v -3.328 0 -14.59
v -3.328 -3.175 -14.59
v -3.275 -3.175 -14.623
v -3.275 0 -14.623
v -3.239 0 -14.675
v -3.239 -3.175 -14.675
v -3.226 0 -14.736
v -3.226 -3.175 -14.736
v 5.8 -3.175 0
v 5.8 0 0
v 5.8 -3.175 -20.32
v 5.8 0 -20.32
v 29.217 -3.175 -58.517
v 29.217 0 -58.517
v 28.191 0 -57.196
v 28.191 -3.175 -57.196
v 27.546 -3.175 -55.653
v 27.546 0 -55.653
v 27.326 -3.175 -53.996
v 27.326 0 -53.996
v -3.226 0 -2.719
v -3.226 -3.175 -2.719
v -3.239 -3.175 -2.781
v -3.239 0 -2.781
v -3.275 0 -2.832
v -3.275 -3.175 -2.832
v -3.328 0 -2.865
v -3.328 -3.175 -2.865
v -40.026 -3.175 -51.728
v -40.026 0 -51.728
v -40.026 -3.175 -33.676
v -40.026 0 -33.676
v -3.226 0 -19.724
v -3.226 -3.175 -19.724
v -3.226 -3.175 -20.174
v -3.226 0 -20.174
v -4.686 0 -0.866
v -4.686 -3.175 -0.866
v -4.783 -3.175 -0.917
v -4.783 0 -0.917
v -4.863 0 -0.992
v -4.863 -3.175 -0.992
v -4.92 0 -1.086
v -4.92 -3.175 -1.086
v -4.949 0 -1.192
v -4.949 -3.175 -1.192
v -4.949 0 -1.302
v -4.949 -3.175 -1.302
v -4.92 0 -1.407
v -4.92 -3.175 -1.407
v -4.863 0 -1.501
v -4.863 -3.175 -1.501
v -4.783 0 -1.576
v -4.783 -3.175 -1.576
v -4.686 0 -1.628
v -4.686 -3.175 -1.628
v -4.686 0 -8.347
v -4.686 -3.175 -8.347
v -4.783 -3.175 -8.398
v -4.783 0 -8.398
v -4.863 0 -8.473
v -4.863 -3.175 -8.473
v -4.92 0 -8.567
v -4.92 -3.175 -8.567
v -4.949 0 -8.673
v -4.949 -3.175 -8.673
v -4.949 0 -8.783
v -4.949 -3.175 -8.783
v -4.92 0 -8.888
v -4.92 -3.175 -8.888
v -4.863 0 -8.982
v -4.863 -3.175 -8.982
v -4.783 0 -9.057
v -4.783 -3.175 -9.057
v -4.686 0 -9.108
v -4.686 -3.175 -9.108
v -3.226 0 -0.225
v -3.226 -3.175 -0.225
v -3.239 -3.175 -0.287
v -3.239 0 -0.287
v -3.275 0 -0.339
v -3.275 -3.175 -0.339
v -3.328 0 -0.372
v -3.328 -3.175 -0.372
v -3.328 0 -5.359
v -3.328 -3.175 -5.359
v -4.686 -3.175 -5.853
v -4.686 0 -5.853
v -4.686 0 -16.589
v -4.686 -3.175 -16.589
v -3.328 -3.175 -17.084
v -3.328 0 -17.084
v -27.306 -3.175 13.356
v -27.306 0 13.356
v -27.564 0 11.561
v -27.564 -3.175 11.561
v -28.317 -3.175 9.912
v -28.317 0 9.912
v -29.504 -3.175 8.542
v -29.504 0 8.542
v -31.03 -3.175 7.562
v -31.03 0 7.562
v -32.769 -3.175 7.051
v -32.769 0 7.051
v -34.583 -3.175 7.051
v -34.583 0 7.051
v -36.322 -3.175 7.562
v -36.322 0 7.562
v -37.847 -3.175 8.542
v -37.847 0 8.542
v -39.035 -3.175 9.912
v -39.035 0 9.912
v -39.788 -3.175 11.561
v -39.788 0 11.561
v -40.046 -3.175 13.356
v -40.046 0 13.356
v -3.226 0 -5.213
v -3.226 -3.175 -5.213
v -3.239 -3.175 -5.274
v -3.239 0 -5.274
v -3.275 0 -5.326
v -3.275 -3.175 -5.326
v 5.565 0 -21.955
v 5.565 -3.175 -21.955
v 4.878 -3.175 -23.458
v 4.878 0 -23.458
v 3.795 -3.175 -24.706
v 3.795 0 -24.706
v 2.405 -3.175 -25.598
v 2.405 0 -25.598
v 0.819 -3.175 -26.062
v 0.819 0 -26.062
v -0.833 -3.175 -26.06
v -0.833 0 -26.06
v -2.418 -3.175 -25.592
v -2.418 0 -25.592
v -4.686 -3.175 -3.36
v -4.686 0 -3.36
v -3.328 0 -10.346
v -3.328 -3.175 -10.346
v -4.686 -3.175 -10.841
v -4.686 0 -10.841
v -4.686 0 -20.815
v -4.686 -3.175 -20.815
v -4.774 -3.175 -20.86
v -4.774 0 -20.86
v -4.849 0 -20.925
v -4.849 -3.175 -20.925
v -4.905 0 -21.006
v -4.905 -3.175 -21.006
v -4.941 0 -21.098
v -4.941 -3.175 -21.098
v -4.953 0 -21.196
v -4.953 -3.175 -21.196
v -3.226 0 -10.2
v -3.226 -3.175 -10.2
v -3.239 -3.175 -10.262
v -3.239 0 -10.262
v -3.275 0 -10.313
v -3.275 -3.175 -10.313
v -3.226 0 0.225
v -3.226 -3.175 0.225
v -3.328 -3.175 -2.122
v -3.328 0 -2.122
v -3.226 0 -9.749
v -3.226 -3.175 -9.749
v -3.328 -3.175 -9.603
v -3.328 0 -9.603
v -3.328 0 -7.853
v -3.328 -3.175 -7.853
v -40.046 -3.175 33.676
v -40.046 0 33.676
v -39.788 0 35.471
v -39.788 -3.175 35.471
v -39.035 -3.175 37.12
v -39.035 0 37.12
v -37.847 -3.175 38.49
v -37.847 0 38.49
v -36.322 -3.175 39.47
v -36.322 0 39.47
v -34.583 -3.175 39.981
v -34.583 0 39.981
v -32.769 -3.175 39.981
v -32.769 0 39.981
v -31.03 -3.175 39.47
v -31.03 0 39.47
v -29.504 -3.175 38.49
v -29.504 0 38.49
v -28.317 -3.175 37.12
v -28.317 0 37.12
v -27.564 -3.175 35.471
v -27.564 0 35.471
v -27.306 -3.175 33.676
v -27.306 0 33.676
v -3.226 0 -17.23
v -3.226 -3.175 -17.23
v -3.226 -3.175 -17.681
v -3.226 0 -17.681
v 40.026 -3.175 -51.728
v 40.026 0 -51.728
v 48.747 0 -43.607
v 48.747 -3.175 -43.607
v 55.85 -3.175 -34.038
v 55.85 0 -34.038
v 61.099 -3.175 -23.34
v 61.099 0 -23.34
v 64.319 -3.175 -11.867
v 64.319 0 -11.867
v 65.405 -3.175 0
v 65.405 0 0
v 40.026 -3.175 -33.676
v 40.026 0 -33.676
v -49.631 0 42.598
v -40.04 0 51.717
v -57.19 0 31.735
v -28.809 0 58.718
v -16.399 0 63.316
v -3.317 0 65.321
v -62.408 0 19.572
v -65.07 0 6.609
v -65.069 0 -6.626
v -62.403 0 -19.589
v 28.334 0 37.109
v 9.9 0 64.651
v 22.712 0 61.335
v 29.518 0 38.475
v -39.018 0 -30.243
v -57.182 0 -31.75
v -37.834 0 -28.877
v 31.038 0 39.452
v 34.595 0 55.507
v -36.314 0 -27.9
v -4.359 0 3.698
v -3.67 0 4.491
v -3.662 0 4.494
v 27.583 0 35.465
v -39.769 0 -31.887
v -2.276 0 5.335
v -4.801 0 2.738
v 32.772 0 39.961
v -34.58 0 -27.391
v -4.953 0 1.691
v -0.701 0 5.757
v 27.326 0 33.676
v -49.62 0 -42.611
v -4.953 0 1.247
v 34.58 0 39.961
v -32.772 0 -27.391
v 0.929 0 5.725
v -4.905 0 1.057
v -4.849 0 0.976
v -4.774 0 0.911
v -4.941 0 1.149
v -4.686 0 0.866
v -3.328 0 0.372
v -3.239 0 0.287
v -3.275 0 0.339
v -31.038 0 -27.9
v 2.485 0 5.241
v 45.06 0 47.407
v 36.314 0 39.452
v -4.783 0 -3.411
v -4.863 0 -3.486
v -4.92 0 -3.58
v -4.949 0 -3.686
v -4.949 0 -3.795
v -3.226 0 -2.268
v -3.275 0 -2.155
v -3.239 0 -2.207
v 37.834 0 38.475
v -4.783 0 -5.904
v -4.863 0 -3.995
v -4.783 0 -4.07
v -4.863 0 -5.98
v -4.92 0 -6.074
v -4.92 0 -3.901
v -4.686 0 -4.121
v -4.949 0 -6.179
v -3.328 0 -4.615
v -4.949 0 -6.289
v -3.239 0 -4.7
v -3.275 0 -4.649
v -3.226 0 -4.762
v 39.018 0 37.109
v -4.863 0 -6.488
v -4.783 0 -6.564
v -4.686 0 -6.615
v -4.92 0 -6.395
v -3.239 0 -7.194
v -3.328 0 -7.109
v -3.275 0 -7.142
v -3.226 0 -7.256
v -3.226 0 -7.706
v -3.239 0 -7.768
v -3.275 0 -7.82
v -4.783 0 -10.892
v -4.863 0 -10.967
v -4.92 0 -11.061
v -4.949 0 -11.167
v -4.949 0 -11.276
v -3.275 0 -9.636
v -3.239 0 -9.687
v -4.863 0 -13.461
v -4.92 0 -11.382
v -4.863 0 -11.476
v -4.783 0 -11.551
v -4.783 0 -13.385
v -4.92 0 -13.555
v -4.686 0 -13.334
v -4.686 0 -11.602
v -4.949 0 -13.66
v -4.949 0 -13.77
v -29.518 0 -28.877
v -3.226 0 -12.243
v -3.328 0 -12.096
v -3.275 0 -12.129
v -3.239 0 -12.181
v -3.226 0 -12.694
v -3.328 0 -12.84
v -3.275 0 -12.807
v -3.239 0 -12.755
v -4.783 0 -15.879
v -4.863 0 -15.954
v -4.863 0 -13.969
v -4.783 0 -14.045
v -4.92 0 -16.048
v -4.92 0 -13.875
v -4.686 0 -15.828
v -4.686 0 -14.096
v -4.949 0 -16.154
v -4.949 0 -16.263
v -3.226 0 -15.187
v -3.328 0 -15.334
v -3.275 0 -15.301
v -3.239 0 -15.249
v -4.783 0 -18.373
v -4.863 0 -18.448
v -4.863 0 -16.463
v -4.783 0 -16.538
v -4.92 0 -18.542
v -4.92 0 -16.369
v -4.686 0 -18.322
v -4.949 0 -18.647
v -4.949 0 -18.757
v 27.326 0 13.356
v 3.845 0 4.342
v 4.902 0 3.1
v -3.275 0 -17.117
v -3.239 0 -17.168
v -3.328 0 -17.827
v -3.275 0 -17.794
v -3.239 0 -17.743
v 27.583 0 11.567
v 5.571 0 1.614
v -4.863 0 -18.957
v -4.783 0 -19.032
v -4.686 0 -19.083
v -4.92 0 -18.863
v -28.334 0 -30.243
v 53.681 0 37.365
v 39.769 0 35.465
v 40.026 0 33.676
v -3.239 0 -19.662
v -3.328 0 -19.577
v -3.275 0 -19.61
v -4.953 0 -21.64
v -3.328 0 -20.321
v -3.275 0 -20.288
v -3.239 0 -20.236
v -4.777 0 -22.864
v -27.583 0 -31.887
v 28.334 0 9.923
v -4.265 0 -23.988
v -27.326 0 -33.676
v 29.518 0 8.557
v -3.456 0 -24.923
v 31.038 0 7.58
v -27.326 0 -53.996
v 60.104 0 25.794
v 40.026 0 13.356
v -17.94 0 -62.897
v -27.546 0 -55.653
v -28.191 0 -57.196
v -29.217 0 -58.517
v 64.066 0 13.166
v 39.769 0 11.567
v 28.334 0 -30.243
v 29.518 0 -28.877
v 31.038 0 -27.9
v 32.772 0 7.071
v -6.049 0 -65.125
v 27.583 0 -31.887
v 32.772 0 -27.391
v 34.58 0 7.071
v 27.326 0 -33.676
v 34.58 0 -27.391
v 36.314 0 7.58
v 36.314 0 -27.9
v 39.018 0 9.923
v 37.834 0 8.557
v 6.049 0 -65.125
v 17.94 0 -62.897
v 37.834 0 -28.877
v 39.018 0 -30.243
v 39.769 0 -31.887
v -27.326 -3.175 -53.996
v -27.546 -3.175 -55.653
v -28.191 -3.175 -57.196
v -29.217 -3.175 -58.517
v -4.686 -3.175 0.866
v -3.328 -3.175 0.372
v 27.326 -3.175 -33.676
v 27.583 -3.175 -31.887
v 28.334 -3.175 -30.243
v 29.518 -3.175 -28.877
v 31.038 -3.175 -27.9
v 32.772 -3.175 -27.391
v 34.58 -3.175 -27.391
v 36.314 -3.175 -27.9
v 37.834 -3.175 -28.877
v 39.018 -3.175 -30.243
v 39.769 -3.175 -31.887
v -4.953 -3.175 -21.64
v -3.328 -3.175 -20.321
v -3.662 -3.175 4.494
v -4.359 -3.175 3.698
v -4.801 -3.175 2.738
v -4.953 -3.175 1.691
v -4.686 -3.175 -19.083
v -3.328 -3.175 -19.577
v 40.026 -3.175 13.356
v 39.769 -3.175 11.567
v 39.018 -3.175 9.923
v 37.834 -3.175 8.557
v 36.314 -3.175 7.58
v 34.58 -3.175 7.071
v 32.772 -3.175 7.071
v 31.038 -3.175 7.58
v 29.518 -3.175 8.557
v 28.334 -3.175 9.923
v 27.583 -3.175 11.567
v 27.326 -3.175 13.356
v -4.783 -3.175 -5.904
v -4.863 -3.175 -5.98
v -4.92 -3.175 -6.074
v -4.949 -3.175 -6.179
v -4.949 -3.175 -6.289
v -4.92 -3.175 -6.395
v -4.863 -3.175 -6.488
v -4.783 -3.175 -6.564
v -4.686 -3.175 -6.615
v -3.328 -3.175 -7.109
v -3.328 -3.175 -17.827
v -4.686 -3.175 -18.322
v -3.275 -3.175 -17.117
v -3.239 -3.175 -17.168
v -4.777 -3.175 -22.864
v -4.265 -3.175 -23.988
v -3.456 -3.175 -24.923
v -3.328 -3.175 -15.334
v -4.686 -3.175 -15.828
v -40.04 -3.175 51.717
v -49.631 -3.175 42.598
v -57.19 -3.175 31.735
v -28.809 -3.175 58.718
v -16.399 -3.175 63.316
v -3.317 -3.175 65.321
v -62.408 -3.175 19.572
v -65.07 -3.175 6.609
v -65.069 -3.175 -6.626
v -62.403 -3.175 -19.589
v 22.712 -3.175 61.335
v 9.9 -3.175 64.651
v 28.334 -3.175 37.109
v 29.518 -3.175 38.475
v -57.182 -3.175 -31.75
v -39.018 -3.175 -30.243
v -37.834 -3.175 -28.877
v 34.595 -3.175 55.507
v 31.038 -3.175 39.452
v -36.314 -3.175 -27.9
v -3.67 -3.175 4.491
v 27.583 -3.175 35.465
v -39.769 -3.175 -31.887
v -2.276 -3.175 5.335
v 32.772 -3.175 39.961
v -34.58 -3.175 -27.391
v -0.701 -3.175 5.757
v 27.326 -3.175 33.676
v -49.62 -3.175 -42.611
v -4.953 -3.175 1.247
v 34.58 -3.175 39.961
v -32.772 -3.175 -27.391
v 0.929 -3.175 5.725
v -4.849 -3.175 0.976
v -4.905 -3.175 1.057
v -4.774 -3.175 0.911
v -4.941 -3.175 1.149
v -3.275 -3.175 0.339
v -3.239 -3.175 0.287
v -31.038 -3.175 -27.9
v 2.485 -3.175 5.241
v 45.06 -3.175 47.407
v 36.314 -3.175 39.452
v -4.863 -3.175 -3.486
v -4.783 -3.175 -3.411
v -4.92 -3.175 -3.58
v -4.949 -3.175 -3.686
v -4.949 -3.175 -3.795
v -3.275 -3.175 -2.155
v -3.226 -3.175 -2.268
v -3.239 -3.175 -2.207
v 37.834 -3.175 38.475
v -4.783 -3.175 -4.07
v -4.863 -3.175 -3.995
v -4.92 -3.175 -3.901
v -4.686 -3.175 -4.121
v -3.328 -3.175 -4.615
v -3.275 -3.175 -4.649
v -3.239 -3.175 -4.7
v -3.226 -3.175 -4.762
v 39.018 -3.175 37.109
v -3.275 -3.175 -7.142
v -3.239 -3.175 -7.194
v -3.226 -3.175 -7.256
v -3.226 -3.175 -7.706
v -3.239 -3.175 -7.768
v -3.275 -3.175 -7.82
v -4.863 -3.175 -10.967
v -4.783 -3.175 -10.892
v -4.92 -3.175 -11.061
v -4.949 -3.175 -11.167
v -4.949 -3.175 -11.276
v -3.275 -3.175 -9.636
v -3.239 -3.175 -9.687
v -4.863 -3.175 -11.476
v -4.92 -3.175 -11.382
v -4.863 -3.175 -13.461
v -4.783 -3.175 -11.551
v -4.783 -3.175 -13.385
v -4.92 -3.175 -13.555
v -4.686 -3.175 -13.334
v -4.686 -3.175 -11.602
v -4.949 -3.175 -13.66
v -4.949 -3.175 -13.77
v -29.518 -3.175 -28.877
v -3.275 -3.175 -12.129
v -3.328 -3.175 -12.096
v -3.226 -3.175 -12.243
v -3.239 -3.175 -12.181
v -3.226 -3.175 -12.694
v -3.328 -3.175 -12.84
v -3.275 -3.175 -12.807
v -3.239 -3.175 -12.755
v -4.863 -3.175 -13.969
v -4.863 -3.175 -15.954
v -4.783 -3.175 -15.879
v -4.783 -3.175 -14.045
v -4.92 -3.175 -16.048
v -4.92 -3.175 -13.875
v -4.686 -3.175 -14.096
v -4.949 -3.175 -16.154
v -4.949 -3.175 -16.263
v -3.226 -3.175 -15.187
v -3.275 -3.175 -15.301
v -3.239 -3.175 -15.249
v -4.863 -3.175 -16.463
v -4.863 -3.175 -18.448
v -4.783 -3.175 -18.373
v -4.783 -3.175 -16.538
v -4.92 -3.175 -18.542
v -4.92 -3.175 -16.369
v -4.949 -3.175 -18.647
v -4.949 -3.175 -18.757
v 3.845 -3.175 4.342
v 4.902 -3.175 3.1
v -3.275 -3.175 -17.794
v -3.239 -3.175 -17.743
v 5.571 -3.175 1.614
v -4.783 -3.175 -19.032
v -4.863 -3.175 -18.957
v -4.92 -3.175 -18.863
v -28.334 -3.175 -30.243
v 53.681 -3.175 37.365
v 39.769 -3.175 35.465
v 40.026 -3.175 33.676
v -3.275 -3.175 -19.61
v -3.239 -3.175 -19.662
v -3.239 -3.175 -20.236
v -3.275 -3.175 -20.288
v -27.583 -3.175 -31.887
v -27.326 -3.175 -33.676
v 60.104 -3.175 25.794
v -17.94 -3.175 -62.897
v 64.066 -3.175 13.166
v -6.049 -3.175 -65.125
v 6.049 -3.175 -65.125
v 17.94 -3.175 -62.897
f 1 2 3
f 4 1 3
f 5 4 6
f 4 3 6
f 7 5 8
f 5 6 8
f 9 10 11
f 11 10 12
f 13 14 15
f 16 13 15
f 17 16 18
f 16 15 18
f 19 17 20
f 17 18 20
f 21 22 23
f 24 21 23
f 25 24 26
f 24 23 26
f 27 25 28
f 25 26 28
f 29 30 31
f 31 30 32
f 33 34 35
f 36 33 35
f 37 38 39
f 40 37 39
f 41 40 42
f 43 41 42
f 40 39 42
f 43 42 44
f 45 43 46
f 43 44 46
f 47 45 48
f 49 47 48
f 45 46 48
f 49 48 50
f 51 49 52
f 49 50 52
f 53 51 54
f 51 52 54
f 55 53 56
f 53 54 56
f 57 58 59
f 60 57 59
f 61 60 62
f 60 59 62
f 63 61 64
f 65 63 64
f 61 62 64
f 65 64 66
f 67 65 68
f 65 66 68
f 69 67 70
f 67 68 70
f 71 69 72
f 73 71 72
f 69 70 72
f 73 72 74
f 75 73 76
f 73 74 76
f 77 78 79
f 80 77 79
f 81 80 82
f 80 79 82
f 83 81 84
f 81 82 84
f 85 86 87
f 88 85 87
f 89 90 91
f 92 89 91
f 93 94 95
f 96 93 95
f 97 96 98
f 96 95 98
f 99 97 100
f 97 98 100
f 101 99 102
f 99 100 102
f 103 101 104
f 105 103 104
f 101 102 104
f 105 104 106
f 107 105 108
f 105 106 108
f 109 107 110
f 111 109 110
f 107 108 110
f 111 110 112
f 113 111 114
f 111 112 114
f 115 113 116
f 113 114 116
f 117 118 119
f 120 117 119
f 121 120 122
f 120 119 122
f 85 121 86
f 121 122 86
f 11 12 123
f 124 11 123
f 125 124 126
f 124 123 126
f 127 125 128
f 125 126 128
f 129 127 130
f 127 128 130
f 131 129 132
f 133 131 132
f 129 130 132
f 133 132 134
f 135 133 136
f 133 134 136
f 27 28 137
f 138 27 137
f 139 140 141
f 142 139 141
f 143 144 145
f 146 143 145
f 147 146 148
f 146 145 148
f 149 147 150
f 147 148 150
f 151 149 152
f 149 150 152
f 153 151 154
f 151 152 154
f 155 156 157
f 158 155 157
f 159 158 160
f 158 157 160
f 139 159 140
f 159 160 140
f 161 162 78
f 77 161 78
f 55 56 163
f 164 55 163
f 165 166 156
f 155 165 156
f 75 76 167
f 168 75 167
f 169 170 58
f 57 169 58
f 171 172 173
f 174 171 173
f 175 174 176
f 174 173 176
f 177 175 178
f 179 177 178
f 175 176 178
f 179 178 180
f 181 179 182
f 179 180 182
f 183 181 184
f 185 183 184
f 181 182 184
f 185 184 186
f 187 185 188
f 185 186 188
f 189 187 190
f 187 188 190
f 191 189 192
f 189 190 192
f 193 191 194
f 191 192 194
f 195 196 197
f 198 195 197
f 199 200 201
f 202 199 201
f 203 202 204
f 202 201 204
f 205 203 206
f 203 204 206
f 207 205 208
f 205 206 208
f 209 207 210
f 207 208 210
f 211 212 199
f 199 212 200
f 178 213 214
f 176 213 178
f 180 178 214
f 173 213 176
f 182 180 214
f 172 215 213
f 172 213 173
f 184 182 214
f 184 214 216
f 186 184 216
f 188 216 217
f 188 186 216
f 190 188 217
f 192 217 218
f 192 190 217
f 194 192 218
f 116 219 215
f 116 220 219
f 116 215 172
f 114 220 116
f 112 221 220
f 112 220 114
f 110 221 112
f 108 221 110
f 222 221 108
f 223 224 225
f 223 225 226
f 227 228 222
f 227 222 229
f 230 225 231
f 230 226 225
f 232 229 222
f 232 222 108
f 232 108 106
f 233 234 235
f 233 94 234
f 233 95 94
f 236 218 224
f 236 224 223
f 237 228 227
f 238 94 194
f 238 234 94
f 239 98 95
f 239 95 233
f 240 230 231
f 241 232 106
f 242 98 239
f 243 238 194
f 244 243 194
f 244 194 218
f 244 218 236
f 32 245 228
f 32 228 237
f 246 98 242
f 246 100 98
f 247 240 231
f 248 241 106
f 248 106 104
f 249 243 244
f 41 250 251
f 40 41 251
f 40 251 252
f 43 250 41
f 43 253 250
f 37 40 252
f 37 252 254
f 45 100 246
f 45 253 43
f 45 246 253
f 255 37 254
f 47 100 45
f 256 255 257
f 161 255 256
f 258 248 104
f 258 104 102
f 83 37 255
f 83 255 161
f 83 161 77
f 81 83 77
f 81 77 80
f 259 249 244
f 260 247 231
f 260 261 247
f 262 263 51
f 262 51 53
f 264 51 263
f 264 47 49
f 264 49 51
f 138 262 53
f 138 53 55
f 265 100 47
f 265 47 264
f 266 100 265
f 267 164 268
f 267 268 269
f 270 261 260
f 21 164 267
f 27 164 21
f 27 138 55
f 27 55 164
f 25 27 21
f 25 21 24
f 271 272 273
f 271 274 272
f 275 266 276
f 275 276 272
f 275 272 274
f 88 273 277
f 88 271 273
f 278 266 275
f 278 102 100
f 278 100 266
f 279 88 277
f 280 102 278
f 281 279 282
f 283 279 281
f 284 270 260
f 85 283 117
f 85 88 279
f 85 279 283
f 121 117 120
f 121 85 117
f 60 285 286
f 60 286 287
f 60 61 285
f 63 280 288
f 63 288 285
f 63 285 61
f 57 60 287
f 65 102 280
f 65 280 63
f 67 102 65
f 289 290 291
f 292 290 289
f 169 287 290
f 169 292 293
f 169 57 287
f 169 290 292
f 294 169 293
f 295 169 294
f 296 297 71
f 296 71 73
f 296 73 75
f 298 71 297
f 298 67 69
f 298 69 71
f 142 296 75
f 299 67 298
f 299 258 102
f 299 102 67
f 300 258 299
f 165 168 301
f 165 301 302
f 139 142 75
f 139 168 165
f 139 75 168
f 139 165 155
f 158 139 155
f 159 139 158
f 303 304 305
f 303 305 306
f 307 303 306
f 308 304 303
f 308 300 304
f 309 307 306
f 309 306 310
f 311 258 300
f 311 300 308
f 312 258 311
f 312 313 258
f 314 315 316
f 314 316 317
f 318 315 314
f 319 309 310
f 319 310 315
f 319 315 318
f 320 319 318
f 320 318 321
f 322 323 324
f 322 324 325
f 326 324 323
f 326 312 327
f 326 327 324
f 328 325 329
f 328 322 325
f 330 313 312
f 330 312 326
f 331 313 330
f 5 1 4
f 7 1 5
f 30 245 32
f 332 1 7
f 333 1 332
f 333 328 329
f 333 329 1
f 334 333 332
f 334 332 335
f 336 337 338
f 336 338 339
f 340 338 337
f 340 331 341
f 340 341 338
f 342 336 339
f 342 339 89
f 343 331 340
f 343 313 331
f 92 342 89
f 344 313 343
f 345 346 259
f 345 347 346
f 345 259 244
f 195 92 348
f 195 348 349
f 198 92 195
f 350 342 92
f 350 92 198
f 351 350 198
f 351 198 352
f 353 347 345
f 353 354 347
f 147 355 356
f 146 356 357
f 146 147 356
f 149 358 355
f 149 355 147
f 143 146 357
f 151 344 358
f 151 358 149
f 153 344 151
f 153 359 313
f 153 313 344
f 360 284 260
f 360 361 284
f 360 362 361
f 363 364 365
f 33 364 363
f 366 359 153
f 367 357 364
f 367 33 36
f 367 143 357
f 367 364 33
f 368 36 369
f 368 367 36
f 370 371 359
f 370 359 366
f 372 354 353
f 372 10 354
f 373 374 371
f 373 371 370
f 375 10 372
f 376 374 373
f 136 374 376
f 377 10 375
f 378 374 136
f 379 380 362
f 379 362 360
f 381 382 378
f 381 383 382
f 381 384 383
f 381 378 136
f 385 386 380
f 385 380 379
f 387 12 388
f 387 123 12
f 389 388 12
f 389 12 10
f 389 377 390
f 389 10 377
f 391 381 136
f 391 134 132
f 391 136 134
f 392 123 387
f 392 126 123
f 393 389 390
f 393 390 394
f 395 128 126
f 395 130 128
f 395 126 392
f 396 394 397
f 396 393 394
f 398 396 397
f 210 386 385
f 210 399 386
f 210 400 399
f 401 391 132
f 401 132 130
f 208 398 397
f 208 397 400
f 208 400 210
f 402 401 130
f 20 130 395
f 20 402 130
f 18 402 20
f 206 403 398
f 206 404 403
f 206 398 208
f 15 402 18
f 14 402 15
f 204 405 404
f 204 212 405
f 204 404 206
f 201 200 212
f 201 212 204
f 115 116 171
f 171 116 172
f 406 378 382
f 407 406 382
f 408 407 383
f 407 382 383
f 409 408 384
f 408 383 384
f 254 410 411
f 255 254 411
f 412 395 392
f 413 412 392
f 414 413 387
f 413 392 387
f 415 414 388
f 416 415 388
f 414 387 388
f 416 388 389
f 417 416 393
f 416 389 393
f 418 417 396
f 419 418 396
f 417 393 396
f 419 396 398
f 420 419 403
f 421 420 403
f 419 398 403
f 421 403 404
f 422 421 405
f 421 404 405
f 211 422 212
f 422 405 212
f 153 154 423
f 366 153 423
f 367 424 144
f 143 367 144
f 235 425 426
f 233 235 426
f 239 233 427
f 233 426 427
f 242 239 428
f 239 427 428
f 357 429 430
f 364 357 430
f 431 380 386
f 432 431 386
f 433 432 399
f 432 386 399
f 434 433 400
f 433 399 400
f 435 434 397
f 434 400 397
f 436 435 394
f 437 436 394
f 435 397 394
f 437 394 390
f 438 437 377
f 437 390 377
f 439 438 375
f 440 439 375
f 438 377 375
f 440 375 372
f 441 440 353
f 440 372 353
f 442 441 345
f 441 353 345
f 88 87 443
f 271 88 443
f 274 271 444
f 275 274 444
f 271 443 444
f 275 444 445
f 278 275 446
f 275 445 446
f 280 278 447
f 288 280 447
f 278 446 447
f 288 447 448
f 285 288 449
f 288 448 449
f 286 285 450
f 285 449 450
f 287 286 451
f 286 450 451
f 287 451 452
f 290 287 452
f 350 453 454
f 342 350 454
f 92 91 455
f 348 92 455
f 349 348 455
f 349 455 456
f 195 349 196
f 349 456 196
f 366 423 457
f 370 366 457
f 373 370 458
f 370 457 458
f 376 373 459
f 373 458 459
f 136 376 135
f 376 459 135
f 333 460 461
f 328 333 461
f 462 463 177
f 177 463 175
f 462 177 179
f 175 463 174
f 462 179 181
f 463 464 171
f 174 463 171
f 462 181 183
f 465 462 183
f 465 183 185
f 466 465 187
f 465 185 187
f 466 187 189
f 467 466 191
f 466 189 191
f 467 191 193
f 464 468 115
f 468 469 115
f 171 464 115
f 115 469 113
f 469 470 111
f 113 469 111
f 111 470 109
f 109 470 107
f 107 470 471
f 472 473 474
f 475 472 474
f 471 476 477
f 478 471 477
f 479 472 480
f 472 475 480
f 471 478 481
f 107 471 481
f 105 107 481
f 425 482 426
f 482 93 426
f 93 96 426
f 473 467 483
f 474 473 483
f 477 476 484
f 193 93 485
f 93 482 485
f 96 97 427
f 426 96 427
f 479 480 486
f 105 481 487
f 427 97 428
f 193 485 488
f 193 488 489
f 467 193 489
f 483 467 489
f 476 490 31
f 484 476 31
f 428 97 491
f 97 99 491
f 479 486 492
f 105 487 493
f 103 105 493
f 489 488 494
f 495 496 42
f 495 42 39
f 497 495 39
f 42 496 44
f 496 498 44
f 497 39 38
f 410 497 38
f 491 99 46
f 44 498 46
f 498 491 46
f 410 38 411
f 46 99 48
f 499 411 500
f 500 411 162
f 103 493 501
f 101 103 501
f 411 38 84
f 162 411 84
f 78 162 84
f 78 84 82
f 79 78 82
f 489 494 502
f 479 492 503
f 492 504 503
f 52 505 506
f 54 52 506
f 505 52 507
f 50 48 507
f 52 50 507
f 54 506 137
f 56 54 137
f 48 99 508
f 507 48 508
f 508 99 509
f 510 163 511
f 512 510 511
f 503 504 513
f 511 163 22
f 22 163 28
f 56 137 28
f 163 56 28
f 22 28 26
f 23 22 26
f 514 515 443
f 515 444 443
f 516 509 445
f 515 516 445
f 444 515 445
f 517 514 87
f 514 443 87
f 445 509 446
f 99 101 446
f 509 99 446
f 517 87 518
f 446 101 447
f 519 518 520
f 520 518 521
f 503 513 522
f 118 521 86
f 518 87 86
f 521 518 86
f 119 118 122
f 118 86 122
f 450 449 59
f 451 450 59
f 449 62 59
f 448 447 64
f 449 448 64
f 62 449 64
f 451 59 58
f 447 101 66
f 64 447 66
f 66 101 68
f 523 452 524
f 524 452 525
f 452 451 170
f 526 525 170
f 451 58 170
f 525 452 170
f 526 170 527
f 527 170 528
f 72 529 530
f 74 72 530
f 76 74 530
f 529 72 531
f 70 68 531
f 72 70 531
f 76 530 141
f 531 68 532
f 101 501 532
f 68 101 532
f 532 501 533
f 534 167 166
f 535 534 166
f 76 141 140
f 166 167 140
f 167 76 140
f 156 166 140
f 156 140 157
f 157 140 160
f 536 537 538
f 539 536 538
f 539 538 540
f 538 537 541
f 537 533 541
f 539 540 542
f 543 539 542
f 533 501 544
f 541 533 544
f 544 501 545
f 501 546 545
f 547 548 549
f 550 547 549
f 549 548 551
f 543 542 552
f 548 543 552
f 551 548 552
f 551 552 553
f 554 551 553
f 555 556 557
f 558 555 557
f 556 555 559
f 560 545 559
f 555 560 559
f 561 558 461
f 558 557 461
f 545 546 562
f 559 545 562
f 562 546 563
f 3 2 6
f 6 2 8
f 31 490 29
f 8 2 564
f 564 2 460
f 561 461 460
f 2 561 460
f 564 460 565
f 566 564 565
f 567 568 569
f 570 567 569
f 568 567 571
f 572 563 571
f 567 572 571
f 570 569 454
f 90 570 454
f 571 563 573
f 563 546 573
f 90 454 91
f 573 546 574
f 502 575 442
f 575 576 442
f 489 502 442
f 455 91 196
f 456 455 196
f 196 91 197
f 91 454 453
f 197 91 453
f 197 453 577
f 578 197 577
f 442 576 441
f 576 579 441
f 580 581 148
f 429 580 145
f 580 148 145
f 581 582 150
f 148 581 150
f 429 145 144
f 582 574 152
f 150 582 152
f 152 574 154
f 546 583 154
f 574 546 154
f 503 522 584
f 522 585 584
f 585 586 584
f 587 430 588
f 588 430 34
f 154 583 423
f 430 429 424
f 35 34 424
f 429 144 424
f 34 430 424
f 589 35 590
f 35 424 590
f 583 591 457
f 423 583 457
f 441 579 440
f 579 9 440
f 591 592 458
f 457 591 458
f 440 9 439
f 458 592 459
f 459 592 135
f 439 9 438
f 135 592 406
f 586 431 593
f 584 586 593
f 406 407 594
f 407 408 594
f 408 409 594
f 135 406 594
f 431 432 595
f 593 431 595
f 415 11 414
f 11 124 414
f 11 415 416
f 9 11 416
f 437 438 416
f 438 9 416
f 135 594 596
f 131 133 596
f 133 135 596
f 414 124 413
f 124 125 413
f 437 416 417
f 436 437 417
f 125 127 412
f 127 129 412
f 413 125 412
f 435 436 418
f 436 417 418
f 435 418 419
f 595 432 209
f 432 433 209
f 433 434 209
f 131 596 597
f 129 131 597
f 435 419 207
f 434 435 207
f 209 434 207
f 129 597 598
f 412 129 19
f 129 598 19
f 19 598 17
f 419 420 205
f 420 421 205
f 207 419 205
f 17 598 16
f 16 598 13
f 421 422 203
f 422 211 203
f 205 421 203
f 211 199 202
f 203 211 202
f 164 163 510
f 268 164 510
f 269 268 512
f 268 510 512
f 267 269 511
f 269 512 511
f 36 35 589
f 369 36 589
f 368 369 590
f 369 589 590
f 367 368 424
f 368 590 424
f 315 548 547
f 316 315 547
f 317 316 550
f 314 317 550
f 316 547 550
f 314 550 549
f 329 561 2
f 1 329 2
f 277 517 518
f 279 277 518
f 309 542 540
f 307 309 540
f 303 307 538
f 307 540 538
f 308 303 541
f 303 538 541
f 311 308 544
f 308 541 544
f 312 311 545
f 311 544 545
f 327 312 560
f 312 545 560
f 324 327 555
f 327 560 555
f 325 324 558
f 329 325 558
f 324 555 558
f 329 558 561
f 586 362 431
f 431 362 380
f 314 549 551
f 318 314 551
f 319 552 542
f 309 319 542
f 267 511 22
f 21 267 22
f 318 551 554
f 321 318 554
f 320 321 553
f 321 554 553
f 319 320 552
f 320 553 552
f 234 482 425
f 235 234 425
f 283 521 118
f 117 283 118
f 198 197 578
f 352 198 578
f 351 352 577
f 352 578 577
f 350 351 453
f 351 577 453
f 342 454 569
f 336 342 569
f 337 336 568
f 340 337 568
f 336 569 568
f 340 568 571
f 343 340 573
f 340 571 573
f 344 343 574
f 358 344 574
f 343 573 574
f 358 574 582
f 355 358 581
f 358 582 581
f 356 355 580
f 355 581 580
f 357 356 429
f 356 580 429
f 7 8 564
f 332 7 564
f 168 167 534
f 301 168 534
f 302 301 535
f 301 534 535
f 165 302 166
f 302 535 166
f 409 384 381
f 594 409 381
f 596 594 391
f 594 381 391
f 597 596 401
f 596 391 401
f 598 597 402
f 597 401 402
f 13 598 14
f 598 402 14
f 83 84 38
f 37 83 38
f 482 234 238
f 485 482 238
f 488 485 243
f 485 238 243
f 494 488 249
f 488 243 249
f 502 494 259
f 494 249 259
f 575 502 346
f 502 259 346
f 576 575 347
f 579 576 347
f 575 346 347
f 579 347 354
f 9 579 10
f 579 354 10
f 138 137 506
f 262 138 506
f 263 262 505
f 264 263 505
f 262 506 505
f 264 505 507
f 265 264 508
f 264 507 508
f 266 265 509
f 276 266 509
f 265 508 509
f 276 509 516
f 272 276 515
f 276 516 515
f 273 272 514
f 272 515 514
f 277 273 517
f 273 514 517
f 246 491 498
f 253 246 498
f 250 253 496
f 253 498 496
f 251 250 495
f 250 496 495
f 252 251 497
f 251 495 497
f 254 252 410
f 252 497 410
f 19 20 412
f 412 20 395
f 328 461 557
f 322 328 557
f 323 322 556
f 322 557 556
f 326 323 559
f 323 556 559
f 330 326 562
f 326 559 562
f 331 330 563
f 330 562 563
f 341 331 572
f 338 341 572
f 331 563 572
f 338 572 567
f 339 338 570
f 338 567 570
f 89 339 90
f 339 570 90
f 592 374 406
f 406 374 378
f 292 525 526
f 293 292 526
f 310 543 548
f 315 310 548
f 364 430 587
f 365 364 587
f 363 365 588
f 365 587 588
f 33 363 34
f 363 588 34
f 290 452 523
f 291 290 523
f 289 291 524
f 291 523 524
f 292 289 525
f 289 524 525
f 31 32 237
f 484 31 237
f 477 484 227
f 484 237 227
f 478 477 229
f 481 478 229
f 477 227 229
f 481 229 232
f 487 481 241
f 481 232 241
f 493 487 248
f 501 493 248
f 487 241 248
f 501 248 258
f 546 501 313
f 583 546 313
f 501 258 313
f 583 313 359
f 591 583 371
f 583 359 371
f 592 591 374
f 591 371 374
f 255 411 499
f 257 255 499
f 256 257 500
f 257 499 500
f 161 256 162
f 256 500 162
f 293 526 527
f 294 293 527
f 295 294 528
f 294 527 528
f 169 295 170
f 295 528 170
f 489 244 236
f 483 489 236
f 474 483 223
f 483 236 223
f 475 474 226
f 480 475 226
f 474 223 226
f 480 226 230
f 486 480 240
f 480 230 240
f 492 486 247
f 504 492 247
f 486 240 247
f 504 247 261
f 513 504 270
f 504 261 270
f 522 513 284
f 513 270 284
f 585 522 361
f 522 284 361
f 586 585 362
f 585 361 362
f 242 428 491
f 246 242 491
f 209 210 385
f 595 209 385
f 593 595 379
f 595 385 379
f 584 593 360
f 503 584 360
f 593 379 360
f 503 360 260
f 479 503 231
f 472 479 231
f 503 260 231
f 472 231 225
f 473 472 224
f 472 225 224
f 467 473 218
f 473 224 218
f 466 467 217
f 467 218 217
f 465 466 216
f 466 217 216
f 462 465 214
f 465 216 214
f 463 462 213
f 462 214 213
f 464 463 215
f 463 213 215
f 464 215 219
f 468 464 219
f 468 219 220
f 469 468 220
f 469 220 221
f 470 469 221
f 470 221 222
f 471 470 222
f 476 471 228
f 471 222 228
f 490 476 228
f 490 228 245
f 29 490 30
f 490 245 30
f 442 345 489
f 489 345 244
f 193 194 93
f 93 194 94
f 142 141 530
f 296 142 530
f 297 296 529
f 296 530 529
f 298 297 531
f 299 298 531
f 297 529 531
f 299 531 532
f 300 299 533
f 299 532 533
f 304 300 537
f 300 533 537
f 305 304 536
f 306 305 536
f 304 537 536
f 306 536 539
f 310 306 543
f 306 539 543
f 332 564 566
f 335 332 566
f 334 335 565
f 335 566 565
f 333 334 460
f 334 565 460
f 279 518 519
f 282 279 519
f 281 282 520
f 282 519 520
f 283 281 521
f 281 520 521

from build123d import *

# Parameters (mm, degrees)
BOSS_EXTRUDE1_DEPTH = 3.175
BOSS_EXTRUDE3_START = -3.175
BOSS_EXTRUDE3_DEPTH = 3.175


# Read off the part's stored shape, not the designer's step: Boss-Extrude3
with BuildPart() as part:
    # Sketch3 → Boss-Extrude1 (new body)
    with BuildSketch(Plane.XZ):
        with BuildLine():
            ThreePointArc((65.405, 0), (-28.808992359, 58.718446712), (-40.025960454, -51.727521831))
            Line((-40.025960454, -51.727521831), (-40.025960454, -33.675960454))
            ThreePointArc((-40.025960454, -33.675960454), (-33.675960454, -27.325960454), (-27.325960454, -33.675960454))
            Line((-27.325960454, -33.675960454), (-27.325960454, -53.995960454))
            ThreePointArc((-27.325960454, -53.995960454), (-27.817666914, -56.446041432), (-29.21663661, -58.516682836))
            ThreePointArc((-29.21663661, -58.516682836), (0, -65.405), (29.21663661, -58.516682836))
            ThreePointArc((29.21663661, -58.516682836), (27.817666914, -56.446041432), (27.325960454, -53.995960454))
            Line((27.325960454, -53.995960454), (27.325960454, -33.675960454))
            ThreePointArc((27.325960454, -33.675960454), (33.675960454, -27.325960454), (40.025960454, -33.675960454))
            Line((40.025960454, -33.675960454), (40.025960454, -51.727521831))
            ThreePointArc((40.025960454, -51.727521831), (58.718446712, -28.808992359), (65.405, 0))
        make_face()
        with BuildLine():
            ThreePointArc((-5.8, 0), (0, 5.8), (5.8, 0))
            Line((5.8, 0), (5.8, -20.32))
            ThreePointArc((5.8, -20.32), (0, -26.12), (-5.8, -20.32))
            Line((-5.8, -20.32), (-5.8, 0))
        make_face(mode=Mode.SUBTRACT)
        with BuildLine():
            ThreePointArc((-27.305960454, 13.355960454), (-33.675960454, 6.985960454), (-40.045960454, 13.355960454))
            Line((-40.045960454, 13.355960454), (-40.045960454, 33.675960454))
            ThreePointArc((-40.045960454, 33.675960454), (-33.675960454, 40.045960454), (-27.305960454, 33.675960454))
            Line((-27.305960454, 33.675960454), (-27.305960454, 13.355960454))
        make_face(mode=Mode.SUBTRACT)
        with BuildLine():
            ThreePointArc((40.025960454, 13.355960454), (33.675960454, 7.005960454), (27.325960454, 13.355960454))
            Line((27.325960454, 13.355960454), (27.325960454, 33.675960454))
            ThreePointArc((27.325960454, 33.675960454), (33.675960454, 40.025960454), (40.025960454, 33.675960454))
            Line((40.025960454, 33.675960454), (40.025960454, 13.355960454))
        make_face(mode=Mode.SUBTRACT)
    extrude(amount=BOSS_EXTRUDE1_DEPTH)

    # Boss-Extrude3 outline → Boss-Extrude3 (add)
    with BuildSketch(Plane(origin=(0, 0, 0), x_dir=(1, 0, 0), z_dir=(0, 1, 0)).offset(BOSS_EXTRUDE3_START)):
        with BuildLine():
            Line((-4.952891864, -1.691319584), (-4.952891864, -1.246819584))
            ThreePointArc((-4.952891864, -1.246819584), (-4.879618202, -1.014425219), (-4.6863, -0.866086946))
            Line((-4.6863, -0.866086946), (-3.328347771, -0.371832755))
            ThreePointArc((-3.328347771, -0.371832755), (-3.253985597, -0.314772651), (-3.2258, -0.22537936))
            Line((-3.2258, -0.22537936), (-3.2258, 0.22537936))
            ThreePointArc((-3.2258, 0.22537936), (-3.253985597, 0.314772651), (-3.328347771, 0.371832755))
            Line((-3.328347771, 0.371832755), (-4.6863, 0.866086946))
            ThreePointArc((-4.6863, 0.866086946), (-4.952891864, 1.246819585), (-4.6863, 1.627552223))
            Line((-4.6863, 1.627552223), (-3.328347771, 2.121806414))
            ThreePointArc((-3.328347771, 2.121806414), (-3.253985597, 2.178866518), (-3.2258, 2.268259809))
            Line((-3.2258, 2.268259809), (-3.2258, 2.719018529))
            ThreePointArc((-3.2258, 2.719018529), (-3.253985597, 2.80841182), (-3.328347771, 2.865471924))
            Line((-3.328347771, 2.865471924), (-4.6863, 3.359726115))
            ThreePointArc((-4.6863, 3.359726115), (-4.952891864, 3.740458754), (-4.6863, 4.121191392))
            Line((-4.6863, 4.121191392), (-3.328347771, 4.615445582))
            ThreePointArc((-3.328347771, 4.615445582), (-3.253985597, 4.672505686), (-3.2258, 4.761898978))
            Line((-3.2258, 4.761898978), (-3.2258, 5.212657697))
            ThreePointArc((-3.2258, 5.212657697), (-3.253985597, 5.302050989), (-3.328347771, 5.359111093))
            Line((-3.328347771, 5.359111093), (-4.6863, 5.853365283))
            ThreePointArc((-4.6863, 5.853365283), (-4.952891864, 6.234097921), (-4.6863, 6.61483056))
            Line((-4.6863, 6.61483056), (-3.328347771, 7.109084751))
            ThreePointArc((-3.328347771, 7.109084751), (-3.253985597, 7.166144855), (-3.2258, 7.255538147))
            Line((-3.2258, 7.255538147), (-3.2258, 7.706296866))
            ThreePointArc((-3.2258, 7.706296866), (-3.253985597, 7.795690157), (-3.328347771, 7.852750261))
            Line((-3.328347771, 7.852750261), (-4.6863, 8.347004452))
            ThreePointArc((-4.6863, 8.347004452), (-4.952891864, 8.72773709), (-4.6863, 9.108469729))
            Line((-4.6863, 9.108469729), (-3.328347771, 9.60272392))
            ThreePointArc((-3.328347771, 9.60272392), (-3.253985597, 9.659784024), (-3.2258, 9.749177315))
            Line((-3.2258, 9.749177315), (-3.2258, 10.199936035))
            ThreePointArc((-3.2258, 10.199936035), (-3.253985597, 10.289329326), (-3.328347771, 10.34638943))
            Line((-3.328347771, 10.34638943), (-4.6863, 10.840643621))
            ThreePointArc((-4.6863, 10.840643621), (-4.952891864, 11.221376259), (-4.6863, 11.602108898))
            Line((-4.6863, 11.602108898), (-3.328347771, 12.096363089))
            ThreePointArc((-3.328347771, 12.096363089), (-3.253985597, 12.153423193), (-3.2258, 12.242816484))
            Line((-3.2258, 12.242816484), (-3.2258, 12.693575204))
            ThreePointArc((-3.2258, 12.693575204), (-3.253985597, 12.782968495), (-3.328347771, 12.840028599))
            Line((-3.328347771, 12.840028599), (-4.6863, 13.33428279))
            ThreePointArc((-4.6863, 13.33428279), (-4.952891864, 13.715015428), (-4.6863, 14.095748067))
            Line((-4.6863, 14.095748067), (-3.328347771, 14.590002258))
            ThreePointArc((-3.328347771, 14.590002258), (-3.253985597, 14.647062362), (-3.2258, 14.736455653))
            Line((-3.2258, 14.736455653), (-3.2258, 15.187214372))
            ThreePointArc((-3.2258, 15.187214372), (-3.253985597, 15.276607664), (-3.328347771, 15.333667768))
            Line((-3.328347771, 15.333667768), (-4.6863, 15.827921959))
            ThreePointArc((-4.6863, 15.827921959), (-4.952891864, 16.208654598), (-4.6863, 16.589387236))
            Line((-4.6863, 16.589387236), (-3.328347771, 17.083641426))
            ThreePointArc((-3.328347771, 17.083641426), (-3.253985597, 17.14070153), (-3.2258, 17.230094822))
            Line((-3.2258, 17.230094822), (-3.2258, 17.680853541))
            ThreePointArc((-3.2258, 17.680853541), (-3.253985597, 17.770246833), (-3.328347771, 17.827306937))
            Line((-3.328347771, 17.827306937), (-4.6863, 18.321561127))
            ThreePointArc((-4.6863, 18.321561127), (-4.952891864, 18.702293766), (-4.6863, 19.083026404))
            Line((-4.6863, 19.083026404), (-3.328347771, 19.577280595))
            ThreePointArc((-3.328347771, 19.577280595), (-3.253985597, 19.634340699), (-3.2258, 19.723733991))
            Line((-3.2258, 19.723733991), (-3.2258, 20.17449271))
            ThreePointArc((-3.2258, 20.17449271), (-3.253985597, 20.263886001), (-3.328347771, 20.320946105))
            Line((-3.328347771, 20.320946105), (-4.6863, 20.815200296))
            ThreePointArc((-4.6863, 20.815200296), (-4.879618202, 20.96353857), (-4.952891864, 21.195932935))
            Line((-4.952891864, 21.195932935), (-4.952891864, 21.640432935))
            ThreePointArc((-4.952891864, 21.640432935), (-4.26463583, 23.987869264), (-2.41779287, 25.592027849))
            ThreePointArc((-2.41779287, 25.592027849), (-4.881761908, 23.45183663), (-5.8, 20.32))
            Line((-5.8, 20.32), (-5.8, 0))
            ThreePointArc((-5.8, 0), (-5.240594871, -2.485189209), (-3.670287792, -4.490989593))
            Line((-3.670287792, -4.490989593), (-3.662076811, -4.493978146))
            ThreePointArc((-3.662076811, -4.493978146), (-4.614680156, -3.234133451), (-4.952891864, -1.691319584))
        make_face()
    extrude(amount=BOSS_EXTRUDE3_DEPTH)


solid = part.part
